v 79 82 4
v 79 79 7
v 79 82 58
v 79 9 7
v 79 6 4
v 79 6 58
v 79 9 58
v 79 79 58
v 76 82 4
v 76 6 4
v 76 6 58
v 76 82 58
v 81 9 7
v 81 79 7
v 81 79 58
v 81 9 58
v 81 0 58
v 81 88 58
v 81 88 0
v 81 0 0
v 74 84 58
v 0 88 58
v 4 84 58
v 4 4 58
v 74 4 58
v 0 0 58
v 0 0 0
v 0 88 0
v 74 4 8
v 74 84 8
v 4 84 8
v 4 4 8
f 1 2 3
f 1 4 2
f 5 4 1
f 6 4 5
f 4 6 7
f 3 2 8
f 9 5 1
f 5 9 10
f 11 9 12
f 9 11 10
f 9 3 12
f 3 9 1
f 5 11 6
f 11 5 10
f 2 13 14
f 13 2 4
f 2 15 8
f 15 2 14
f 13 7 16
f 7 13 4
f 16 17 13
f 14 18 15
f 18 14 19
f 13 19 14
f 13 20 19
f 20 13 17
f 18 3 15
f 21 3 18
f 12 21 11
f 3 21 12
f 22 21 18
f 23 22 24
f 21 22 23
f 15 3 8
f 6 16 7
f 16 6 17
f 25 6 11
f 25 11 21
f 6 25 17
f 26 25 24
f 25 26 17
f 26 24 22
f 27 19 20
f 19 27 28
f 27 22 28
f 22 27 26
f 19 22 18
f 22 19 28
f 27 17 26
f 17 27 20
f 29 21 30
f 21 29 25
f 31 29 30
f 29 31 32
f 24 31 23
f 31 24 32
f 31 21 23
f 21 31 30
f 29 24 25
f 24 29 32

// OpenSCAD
/*
    Dimensions for objects
    Inner box space
        70mm / 80mm / 100mm
        -> Need half of this vertically
        70 / 80 / 50
        -> Need overlap of 5mmm
        -> Use union to get that
    Shell - total
        4mm / 4mm / 4mm
    Big Sleeve
        3mm / 77mm / 103mm
*/

// Gamma for making things render nicely
y = 0.02;
// Rho for accounting for material expansion
p = 0.2;

// Define inner space
inSpace = [70, 80, 50];

// Define Big Sleeve dimensions
bigSlev = [3, 76, 103];
// Define Big Sleeve edge width
slevEdge = 3;

// Define shell dimensions
oShell = [4, 4, 4];

// Define length of overlap for top/bottom halves
tbO = 5;


// Make dimensions for half of box to fit /DECK/
boxDeck = inSpace + (2*oShell);
// Add on enough space for the big sleeve
boxSlev = boxDeck + [bigSlev[0], 0, 0];



/*
    Make BOTTOM Half of deckbox
*/
module bottomHalf() {
// Difference to refine shape
difference() {
    // Make the big shape
    union() {
        // Make a box that's the total of inner+shell
        cube(boxSlev);
            // Make cube for ribbon
            translate([
            (oShell[0]/2)+(p/2), 
            (oShell[1]/2)+(p/2), 
            (inSpace[2]+(2*oShell[2])-y)
            ])
                cube([
                (inSpace[0]+oShell[0]+bigSlev[0]-p), 
                (inSpace[1]+oShell[1]-p), 
                tbO
                ]);
    }
    
    // Cut out the center box for the cards
    translate(oShell + [0,0,oShell[2]]) 
        cube(inSpace + [0,0,tbO]);
    
    
    // Cut out the space for the Big Sleeve
    translate(oShell + [inSpace[0]+(oShell[0]/2), (oShell[1]/2), 0]) {
        cube(bigSlev);
    
    // Cut out the viewport for the Big Sleeve
        translate([oShell[0]/2+y, slevEdge, slevEdge])
            cube(bigSlev - 2*[0, slevEdge, slevEdge]);
    }

}

}

/*
    Make TOP Half of deckbox
*/
module topHalf() {
difference() {
    // Make a box that's the total of inner+shell
    cube(boxSlev);
    
    
    // Cut out 
    
    
    // Cut out the center box for the cards
    translate(oShell + [0,0,oShell[2]]) 
        cube(inSpace + [0,0,tbO]);
    
    
    // Cut out the space for the Big Sleeve
    translate(oShell + [inSpace[0]+(oShell[0]/2), (oShell[1]/2), 0]) {
        cube(bigSlev);
    
    // Cut out the viewport for the Big Sleeve
        translate([oShell[0]/2+y, slevEdge, slevEdge])
            cube(bigSlev - 2*[0, slevEdge, slevEdge]);
    }

}

}



//bottomHalf();

topHalf();
